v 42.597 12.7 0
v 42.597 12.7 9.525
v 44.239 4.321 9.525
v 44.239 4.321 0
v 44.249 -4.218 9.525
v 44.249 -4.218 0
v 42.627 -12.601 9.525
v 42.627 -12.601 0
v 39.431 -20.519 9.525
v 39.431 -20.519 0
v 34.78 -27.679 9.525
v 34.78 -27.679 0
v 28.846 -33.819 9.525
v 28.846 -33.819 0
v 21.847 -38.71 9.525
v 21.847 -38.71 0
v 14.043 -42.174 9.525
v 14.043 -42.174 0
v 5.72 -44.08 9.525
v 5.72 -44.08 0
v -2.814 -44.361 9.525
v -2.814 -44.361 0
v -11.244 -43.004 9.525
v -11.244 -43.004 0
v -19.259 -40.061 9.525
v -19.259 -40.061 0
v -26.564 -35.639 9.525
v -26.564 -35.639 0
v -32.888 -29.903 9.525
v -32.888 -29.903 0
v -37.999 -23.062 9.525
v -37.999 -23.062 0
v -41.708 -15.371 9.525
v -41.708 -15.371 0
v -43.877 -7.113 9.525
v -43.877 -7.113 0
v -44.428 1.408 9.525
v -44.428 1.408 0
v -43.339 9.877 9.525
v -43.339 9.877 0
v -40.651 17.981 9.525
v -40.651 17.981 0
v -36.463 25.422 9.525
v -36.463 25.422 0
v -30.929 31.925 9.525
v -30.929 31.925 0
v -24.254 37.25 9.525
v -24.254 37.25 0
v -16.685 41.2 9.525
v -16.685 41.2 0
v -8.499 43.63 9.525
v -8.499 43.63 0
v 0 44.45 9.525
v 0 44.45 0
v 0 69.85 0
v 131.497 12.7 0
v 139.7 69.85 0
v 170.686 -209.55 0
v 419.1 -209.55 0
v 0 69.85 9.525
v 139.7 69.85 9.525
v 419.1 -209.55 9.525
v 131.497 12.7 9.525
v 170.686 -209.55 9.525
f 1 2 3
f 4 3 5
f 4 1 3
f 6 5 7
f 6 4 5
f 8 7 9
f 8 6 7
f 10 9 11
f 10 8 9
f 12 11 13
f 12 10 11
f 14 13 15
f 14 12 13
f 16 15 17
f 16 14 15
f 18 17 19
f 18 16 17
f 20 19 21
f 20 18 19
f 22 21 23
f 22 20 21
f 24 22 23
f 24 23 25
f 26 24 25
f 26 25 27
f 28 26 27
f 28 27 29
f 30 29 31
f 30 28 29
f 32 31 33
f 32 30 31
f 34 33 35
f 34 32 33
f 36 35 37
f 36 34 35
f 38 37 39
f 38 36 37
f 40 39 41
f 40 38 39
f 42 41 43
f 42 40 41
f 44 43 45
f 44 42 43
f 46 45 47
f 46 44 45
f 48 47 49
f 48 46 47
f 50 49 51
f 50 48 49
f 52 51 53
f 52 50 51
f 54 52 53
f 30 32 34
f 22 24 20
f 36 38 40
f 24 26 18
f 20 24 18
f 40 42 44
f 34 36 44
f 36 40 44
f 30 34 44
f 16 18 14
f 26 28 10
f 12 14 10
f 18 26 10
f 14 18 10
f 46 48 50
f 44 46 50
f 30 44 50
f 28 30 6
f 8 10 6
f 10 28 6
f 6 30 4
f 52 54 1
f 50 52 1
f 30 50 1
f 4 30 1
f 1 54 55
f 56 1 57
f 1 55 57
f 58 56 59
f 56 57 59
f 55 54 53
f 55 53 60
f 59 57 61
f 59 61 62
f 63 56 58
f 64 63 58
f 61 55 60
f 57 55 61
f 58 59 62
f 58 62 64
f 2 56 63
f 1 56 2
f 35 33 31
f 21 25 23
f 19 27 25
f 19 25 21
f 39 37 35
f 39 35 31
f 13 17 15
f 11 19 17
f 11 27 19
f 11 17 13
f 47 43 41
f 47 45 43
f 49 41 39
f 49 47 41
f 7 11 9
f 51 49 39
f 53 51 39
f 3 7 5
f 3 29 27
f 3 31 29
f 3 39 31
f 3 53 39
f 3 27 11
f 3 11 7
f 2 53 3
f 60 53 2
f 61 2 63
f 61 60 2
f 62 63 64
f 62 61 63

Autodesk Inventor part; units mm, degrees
ref_plane "YZ Plane" through (0, 0, 0) normal (1, 0, 0) x (0, 1, 0)
ref_plane "XZ Plane" through (0, 0, 0) normal (0, 1, 0) x (-1, 0, 0)
ref_plane "XY Plane" through (0, 0, 0) normal (0, 0, 1) x (1, 0, 0)
sketch "Sketch1" plane through (0, 0, 0) normal (0, 0, 1) x (1, 0, 0)
  circle A0 centre (0, 0) radius 44.45
  line L0 (0, 44.45) -> (0, 69.85)
  line L1 (0, 69.85) -> (139.7, 69.85)
  line L2 (139.7, 69.85) -> (419.1, -209.55)
  line L3 (419.1, -209.55) -> (170.6858, -209.55)
  line L4 (131.4971, 12.7) -> (42.5971, 12.7)
  line L5 (131.4971, 12.7) -> (170.6858, -209.55)
  dimension "d0" = 88.9
  dimension "d1" = 25.4
  dimension "d2" = 139.7
  dimension "d3" = 88.9
  dimension "d4" = 135
  dimension "d6" = 279.4
  dimension "d7" = 0
  dimension "d8" = 12.7
  dimension "d9" = 100
extrude "Extrusion1" add sketch "Sketch1" along normal blind 9.525
properties part number "Arm"
